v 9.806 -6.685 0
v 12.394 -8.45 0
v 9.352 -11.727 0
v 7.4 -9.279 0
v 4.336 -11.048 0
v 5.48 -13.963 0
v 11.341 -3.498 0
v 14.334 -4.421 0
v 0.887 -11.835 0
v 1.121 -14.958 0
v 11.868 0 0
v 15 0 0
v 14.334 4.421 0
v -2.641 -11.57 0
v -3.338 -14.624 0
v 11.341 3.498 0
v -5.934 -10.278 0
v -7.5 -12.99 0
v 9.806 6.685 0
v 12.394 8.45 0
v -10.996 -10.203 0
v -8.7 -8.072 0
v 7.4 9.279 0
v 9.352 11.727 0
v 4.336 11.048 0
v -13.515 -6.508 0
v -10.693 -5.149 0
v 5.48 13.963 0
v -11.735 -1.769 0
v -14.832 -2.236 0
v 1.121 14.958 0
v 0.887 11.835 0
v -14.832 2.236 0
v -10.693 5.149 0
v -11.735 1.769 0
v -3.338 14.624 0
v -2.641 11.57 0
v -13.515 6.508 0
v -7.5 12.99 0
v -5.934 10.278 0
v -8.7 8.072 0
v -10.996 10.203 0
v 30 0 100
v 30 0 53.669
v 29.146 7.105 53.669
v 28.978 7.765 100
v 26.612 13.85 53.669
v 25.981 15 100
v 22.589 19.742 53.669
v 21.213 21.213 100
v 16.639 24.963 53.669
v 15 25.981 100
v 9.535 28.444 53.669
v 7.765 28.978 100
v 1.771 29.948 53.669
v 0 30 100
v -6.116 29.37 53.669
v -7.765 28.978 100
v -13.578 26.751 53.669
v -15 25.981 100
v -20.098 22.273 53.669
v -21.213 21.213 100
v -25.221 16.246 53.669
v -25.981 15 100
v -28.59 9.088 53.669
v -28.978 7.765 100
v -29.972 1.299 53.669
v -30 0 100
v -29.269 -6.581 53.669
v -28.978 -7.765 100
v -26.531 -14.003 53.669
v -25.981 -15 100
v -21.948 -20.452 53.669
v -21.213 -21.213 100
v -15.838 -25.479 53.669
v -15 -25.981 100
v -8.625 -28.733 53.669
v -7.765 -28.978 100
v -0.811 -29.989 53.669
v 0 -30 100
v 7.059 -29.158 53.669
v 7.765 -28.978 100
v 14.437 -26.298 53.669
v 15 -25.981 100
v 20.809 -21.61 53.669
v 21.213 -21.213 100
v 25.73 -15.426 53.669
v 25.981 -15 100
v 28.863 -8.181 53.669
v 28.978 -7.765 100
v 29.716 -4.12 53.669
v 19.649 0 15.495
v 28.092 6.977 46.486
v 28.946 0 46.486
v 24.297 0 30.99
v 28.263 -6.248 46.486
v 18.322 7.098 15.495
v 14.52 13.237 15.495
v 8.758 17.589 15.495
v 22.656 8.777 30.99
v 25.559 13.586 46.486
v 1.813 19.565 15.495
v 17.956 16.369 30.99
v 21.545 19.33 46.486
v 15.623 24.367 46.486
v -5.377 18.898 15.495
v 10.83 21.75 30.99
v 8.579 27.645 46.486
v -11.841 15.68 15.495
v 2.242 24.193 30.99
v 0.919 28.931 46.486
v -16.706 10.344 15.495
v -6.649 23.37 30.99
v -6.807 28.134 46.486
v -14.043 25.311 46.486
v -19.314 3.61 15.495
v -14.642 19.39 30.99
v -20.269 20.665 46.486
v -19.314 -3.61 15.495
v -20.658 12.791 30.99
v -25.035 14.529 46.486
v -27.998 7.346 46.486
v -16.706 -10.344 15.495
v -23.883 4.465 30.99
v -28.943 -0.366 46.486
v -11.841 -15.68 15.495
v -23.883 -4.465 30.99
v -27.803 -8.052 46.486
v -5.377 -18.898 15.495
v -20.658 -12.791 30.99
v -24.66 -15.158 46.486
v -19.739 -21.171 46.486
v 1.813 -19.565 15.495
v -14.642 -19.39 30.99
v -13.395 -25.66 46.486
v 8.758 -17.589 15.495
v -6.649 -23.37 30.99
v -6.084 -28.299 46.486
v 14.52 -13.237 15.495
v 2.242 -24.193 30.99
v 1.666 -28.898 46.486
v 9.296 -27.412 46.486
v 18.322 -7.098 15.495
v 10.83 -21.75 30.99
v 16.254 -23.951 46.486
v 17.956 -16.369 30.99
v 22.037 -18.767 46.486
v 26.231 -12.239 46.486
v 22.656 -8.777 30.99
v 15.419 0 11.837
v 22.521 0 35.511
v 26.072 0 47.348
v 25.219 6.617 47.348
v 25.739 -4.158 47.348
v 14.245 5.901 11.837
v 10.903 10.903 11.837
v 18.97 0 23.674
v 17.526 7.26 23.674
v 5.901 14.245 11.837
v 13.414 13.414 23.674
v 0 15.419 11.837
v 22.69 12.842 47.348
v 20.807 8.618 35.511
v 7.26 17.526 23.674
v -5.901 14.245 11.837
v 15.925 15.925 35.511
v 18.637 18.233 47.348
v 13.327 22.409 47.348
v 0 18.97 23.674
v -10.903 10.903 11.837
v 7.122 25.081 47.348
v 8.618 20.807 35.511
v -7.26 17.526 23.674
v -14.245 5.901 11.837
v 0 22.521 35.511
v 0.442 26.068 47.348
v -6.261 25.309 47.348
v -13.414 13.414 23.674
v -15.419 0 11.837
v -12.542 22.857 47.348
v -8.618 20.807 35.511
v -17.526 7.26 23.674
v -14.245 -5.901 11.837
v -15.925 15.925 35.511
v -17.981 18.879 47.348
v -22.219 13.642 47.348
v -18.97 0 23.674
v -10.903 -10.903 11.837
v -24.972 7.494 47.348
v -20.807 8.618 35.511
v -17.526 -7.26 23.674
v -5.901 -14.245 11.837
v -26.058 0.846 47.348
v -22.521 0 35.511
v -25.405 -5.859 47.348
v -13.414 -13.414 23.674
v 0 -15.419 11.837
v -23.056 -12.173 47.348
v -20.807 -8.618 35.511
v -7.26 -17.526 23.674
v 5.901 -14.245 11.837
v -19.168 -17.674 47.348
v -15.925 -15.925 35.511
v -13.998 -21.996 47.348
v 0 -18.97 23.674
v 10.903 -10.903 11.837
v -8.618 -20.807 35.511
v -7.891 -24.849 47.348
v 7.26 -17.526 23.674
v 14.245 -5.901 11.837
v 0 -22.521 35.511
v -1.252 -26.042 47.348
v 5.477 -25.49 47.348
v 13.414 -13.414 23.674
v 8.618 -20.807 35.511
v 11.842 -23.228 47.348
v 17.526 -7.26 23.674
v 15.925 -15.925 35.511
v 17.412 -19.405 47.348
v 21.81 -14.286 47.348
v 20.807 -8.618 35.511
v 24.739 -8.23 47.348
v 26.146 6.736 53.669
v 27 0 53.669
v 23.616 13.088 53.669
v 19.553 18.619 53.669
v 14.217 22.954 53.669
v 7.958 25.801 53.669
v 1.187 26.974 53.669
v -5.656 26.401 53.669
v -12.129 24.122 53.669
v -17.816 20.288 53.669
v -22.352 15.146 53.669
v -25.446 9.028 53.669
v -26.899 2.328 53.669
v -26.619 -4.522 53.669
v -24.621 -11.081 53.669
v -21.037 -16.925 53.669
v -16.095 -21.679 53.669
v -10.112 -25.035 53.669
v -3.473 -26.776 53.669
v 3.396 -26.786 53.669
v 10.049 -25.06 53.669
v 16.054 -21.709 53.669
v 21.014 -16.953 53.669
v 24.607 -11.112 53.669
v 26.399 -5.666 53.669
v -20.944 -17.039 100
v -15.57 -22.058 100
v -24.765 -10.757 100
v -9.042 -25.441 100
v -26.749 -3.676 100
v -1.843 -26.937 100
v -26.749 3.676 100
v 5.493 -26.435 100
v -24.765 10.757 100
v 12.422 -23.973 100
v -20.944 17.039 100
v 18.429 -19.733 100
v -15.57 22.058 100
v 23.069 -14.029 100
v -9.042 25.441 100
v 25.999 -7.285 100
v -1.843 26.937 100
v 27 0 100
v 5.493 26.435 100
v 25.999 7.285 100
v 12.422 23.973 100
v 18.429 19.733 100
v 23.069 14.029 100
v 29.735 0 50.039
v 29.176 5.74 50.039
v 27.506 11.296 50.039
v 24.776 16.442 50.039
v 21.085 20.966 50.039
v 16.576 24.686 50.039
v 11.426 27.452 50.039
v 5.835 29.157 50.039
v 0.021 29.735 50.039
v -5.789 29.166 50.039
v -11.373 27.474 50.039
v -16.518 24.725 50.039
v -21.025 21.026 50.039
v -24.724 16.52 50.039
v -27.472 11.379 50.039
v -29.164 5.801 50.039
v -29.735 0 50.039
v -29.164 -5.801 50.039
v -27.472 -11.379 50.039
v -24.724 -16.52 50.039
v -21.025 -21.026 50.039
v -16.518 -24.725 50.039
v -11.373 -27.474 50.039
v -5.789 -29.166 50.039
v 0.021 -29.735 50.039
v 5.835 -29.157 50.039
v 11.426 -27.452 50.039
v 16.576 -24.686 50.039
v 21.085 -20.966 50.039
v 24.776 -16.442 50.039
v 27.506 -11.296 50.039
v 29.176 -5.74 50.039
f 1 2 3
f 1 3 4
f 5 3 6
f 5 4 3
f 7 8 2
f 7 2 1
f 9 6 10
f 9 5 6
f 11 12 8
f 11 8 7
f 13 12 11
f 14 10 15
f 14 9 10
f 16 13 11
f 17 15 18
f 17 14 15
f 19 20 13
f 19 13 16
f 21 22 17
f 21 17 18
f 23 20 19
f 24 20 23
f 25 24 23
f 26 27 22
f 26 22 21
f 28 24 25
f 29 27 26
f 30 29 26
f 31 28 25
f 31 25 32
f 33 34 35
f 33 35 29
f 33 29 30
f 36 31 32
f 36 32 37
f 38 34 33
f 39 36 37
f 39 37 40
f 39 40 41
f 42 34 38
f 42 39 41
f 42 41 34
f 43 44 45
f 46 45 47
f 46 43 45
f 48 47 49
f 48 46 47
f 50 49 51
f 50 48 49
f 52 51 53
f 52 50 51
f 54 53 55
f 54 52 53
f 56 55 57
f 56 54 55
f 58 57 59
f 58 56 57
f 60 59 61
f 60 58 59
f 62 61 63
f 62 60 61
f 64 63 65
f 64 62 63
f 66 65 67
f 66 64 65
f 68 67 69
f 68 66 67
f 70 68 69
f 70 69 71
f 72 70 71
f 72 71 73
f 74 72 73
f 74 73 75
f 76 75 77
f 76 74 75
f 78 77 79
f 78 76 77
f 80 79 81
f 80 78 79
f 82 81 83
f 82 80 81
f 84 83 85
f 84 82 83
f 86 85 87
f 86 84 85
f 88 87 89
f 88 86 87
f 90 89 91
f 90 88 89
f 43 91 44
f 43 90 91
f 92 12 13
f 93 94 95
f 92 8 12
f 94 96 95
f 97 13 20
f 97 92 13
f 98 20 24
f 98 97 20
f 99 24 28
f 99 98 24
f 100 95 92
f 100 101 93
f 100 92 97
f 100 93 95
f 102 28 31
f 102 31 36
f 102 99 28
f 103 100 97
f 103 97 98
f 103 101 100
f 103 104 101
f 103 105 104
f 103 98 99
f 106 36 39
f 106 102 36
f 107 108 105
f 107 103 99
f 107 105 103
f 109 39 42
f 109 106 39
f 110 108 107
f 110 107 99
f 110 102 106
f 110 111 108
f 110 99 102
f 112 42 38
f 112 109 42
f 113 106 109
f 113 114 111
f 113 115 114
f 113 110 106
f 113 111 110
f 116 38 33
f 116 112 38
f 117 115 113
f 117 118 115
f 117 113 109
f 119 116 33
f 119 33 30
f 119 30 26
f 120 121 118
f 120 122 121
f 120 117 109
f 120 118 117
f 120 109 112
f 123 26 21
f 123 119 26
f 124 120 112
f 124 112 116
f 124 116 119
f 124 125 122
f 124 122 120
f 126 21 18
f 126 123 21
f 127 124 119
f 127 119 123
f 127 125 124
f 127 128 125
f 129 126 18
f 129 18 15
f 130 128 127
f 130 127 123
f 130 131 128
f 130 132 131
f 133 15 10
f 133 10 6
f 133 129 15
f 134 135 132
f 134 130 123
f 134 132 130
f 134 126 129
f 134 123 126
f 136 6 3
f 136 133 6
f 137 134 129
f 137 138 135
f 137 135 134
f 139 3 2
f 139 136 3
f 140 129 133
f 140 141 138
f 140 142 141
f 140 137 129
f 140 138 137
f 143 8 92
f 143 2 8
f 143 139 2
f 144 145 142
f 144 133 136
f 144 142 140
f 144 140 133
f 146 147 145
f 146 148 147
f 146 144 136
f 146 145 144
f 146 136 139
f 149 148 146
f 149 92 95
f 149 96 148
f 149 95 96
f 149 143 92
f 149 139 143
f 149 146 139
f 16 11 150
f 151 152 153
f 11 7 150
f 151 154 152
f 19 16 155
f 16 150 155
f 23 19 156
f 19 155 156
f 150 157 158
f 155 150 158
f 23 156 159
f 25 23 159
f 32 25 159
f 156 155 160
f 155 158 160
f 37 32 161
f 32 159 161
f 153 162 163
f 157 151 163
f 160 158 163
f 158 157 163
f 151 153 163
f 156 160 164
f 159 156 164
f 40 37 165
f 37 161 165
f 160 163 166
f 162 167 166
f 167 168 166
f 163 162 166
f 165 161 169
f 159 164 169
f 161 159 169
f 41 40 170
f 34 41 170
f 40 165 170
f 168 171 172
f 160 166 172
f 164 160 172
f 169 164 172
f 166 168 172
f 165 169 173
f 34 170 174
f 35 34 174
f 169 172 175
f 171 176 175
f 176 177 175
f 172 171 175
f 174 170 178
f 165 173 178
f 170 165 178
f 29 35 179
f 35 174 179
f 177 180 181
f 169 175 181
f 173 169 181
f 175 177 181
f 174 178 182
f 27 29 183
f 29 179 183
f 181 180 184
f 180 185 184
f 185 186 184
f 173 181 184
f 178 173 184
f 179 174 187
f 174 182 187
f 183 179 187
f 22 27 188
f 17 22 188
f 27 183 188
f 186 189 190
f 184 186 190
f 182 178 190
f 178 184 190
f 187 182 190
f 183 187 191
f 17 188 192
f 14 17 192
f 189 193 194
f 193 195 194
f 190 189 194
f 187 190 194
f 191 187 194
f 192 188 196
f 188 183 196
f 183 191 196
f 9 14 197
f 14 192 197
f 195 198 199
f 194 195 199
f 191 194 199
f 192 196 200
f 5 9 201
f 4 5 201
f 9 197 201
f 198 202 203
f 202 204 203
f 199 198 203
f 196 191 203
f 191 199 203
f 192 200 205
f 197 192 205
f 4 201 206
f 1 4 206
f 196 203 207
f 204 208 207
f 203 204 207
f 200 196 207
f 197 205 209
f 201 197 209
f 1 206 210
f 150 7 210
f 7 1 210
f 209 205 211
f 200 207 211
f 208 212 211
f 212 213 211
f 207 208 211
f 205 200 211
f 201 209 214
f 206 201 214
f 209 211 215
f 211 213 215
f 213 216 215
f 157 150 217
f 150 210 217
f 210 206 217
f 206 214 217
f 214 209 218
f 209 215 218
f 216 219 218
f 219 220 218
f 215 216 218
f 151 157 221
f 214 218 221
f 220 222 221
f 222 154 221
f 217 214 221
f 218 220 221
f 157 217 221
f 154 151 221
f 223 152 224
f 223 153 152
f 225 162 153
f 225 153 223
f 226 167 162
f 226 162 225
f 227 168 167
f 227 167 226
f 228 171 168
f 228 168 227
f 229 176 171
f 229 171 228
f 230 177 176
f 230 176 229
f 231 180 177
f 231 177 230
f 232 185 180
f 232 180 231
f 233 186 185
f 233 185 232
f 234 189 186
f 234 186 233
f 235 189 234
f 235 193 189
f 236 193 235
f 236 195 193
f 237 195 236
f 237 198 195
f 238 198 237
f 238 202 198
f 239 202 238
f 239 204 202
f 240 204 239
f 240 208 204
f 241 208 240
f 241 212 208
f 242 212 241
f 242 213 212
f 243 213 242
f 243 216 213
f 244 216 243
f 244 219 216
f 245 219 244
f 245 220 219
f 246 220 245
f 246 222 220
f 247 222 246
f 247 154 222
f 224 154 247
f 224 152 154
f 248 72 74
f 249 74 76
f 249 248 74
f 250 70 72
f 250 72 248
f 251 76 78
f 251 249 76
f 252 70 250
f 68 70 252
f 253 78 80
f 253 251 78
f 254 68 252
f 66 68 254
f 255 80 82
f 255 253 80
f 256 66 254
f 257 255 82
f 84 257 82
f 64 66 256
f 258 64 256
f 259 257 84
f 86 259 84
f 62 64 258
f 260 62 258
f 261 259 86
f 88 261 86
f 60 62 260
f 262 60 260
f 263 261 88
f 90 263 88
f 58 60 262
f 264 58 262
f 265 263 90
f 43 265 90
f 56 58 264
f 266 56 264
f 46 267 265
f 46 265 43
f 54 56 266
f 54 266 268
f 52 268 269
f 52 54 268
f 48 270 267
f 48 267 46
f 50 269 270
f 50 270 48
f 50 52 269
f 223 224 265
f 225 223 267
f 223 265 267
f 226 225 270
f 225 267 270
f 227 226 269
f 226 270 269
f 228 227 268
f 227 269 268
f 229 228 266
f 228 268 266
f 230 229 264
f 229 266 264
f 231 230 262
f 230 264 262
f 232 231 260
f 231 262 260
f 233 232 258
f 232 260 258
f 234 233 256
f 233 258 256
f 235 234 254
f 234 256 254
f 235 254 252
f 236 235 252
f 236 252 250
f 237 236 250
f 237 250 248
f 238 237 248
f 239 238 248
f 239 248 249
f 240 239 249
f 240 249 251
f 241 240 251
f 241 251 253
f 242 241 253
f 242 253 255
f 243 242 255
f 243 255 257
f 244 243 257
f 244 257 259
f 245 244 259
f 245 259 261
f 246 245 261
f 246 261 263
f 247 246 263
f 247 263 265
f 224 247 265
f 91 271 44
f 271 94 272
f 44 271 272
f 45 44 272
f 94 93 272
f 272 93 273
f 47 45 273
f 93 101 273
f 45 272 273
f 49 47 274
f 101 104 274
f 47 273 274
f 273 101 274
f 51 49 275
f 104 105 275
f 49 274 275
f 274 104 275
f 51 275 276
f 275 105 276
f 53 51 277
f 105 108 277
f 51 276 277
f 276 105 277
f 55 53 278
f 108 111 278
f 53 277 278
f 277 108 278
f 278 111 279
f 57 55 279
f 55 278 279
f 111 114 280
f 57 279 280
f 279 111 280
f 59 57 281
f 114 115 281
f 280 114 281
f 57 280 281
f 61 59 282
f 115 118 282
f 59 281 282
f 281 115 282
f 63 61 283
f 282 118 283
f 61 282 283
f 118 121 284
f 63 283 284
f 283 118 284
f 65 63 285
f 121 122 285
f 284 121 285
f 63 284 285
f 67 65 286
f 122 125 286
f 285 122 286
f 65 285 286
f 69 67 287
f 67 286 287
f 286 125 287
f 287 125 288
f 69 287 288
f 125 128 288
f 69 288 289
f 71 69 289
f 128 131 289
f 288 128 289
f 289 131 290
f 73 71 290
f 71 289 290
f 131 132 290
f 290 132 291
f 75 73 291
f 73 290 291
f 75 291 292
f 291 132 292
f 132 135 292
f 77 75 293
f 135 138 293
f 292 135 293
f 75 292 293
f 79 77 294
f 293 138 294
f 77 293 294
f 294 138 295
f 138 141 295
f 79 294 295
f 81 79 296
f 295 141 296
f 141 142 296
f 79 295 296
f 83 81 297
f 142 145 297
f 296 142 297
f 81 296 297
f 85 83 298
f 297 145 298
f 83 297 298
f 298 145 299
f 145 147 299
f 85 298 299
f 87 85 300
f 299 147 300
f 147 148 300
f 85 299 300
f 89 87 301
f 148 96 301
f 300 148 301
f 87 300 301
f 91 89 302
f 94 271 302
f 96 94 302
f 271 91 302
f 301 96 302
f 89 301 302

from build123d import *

# Parameters (mm, degrees)
F2_R = 25
F3_T = -3


with BuildPart() as f1:
    # F0 (on Front) → F1 (revolve)
    with BuildSketch(Plane.XZ):
        Polygon((0, 100), (0, 0), (15, 0), (30, 50), (30, 100), align=None)
    revolve(axis=Axis((0, 0, 50), (0, 0, 1)))

    # F2
    f2_edges = [f1.edges().sort_by_distance(p)[0] for p in [
        (-30, 0, 50),
    ]]
    fillet(f2_edges, radius=F2_R)

    # F3
    f3_openings = [f1.faces().sort_by_distance(p)[0] for p in [
        (0, 0, 100),
        (0, 0, 0),
    ]]
    offset(amount=F3_T, openings=f3_openings)


solid = f1.part
